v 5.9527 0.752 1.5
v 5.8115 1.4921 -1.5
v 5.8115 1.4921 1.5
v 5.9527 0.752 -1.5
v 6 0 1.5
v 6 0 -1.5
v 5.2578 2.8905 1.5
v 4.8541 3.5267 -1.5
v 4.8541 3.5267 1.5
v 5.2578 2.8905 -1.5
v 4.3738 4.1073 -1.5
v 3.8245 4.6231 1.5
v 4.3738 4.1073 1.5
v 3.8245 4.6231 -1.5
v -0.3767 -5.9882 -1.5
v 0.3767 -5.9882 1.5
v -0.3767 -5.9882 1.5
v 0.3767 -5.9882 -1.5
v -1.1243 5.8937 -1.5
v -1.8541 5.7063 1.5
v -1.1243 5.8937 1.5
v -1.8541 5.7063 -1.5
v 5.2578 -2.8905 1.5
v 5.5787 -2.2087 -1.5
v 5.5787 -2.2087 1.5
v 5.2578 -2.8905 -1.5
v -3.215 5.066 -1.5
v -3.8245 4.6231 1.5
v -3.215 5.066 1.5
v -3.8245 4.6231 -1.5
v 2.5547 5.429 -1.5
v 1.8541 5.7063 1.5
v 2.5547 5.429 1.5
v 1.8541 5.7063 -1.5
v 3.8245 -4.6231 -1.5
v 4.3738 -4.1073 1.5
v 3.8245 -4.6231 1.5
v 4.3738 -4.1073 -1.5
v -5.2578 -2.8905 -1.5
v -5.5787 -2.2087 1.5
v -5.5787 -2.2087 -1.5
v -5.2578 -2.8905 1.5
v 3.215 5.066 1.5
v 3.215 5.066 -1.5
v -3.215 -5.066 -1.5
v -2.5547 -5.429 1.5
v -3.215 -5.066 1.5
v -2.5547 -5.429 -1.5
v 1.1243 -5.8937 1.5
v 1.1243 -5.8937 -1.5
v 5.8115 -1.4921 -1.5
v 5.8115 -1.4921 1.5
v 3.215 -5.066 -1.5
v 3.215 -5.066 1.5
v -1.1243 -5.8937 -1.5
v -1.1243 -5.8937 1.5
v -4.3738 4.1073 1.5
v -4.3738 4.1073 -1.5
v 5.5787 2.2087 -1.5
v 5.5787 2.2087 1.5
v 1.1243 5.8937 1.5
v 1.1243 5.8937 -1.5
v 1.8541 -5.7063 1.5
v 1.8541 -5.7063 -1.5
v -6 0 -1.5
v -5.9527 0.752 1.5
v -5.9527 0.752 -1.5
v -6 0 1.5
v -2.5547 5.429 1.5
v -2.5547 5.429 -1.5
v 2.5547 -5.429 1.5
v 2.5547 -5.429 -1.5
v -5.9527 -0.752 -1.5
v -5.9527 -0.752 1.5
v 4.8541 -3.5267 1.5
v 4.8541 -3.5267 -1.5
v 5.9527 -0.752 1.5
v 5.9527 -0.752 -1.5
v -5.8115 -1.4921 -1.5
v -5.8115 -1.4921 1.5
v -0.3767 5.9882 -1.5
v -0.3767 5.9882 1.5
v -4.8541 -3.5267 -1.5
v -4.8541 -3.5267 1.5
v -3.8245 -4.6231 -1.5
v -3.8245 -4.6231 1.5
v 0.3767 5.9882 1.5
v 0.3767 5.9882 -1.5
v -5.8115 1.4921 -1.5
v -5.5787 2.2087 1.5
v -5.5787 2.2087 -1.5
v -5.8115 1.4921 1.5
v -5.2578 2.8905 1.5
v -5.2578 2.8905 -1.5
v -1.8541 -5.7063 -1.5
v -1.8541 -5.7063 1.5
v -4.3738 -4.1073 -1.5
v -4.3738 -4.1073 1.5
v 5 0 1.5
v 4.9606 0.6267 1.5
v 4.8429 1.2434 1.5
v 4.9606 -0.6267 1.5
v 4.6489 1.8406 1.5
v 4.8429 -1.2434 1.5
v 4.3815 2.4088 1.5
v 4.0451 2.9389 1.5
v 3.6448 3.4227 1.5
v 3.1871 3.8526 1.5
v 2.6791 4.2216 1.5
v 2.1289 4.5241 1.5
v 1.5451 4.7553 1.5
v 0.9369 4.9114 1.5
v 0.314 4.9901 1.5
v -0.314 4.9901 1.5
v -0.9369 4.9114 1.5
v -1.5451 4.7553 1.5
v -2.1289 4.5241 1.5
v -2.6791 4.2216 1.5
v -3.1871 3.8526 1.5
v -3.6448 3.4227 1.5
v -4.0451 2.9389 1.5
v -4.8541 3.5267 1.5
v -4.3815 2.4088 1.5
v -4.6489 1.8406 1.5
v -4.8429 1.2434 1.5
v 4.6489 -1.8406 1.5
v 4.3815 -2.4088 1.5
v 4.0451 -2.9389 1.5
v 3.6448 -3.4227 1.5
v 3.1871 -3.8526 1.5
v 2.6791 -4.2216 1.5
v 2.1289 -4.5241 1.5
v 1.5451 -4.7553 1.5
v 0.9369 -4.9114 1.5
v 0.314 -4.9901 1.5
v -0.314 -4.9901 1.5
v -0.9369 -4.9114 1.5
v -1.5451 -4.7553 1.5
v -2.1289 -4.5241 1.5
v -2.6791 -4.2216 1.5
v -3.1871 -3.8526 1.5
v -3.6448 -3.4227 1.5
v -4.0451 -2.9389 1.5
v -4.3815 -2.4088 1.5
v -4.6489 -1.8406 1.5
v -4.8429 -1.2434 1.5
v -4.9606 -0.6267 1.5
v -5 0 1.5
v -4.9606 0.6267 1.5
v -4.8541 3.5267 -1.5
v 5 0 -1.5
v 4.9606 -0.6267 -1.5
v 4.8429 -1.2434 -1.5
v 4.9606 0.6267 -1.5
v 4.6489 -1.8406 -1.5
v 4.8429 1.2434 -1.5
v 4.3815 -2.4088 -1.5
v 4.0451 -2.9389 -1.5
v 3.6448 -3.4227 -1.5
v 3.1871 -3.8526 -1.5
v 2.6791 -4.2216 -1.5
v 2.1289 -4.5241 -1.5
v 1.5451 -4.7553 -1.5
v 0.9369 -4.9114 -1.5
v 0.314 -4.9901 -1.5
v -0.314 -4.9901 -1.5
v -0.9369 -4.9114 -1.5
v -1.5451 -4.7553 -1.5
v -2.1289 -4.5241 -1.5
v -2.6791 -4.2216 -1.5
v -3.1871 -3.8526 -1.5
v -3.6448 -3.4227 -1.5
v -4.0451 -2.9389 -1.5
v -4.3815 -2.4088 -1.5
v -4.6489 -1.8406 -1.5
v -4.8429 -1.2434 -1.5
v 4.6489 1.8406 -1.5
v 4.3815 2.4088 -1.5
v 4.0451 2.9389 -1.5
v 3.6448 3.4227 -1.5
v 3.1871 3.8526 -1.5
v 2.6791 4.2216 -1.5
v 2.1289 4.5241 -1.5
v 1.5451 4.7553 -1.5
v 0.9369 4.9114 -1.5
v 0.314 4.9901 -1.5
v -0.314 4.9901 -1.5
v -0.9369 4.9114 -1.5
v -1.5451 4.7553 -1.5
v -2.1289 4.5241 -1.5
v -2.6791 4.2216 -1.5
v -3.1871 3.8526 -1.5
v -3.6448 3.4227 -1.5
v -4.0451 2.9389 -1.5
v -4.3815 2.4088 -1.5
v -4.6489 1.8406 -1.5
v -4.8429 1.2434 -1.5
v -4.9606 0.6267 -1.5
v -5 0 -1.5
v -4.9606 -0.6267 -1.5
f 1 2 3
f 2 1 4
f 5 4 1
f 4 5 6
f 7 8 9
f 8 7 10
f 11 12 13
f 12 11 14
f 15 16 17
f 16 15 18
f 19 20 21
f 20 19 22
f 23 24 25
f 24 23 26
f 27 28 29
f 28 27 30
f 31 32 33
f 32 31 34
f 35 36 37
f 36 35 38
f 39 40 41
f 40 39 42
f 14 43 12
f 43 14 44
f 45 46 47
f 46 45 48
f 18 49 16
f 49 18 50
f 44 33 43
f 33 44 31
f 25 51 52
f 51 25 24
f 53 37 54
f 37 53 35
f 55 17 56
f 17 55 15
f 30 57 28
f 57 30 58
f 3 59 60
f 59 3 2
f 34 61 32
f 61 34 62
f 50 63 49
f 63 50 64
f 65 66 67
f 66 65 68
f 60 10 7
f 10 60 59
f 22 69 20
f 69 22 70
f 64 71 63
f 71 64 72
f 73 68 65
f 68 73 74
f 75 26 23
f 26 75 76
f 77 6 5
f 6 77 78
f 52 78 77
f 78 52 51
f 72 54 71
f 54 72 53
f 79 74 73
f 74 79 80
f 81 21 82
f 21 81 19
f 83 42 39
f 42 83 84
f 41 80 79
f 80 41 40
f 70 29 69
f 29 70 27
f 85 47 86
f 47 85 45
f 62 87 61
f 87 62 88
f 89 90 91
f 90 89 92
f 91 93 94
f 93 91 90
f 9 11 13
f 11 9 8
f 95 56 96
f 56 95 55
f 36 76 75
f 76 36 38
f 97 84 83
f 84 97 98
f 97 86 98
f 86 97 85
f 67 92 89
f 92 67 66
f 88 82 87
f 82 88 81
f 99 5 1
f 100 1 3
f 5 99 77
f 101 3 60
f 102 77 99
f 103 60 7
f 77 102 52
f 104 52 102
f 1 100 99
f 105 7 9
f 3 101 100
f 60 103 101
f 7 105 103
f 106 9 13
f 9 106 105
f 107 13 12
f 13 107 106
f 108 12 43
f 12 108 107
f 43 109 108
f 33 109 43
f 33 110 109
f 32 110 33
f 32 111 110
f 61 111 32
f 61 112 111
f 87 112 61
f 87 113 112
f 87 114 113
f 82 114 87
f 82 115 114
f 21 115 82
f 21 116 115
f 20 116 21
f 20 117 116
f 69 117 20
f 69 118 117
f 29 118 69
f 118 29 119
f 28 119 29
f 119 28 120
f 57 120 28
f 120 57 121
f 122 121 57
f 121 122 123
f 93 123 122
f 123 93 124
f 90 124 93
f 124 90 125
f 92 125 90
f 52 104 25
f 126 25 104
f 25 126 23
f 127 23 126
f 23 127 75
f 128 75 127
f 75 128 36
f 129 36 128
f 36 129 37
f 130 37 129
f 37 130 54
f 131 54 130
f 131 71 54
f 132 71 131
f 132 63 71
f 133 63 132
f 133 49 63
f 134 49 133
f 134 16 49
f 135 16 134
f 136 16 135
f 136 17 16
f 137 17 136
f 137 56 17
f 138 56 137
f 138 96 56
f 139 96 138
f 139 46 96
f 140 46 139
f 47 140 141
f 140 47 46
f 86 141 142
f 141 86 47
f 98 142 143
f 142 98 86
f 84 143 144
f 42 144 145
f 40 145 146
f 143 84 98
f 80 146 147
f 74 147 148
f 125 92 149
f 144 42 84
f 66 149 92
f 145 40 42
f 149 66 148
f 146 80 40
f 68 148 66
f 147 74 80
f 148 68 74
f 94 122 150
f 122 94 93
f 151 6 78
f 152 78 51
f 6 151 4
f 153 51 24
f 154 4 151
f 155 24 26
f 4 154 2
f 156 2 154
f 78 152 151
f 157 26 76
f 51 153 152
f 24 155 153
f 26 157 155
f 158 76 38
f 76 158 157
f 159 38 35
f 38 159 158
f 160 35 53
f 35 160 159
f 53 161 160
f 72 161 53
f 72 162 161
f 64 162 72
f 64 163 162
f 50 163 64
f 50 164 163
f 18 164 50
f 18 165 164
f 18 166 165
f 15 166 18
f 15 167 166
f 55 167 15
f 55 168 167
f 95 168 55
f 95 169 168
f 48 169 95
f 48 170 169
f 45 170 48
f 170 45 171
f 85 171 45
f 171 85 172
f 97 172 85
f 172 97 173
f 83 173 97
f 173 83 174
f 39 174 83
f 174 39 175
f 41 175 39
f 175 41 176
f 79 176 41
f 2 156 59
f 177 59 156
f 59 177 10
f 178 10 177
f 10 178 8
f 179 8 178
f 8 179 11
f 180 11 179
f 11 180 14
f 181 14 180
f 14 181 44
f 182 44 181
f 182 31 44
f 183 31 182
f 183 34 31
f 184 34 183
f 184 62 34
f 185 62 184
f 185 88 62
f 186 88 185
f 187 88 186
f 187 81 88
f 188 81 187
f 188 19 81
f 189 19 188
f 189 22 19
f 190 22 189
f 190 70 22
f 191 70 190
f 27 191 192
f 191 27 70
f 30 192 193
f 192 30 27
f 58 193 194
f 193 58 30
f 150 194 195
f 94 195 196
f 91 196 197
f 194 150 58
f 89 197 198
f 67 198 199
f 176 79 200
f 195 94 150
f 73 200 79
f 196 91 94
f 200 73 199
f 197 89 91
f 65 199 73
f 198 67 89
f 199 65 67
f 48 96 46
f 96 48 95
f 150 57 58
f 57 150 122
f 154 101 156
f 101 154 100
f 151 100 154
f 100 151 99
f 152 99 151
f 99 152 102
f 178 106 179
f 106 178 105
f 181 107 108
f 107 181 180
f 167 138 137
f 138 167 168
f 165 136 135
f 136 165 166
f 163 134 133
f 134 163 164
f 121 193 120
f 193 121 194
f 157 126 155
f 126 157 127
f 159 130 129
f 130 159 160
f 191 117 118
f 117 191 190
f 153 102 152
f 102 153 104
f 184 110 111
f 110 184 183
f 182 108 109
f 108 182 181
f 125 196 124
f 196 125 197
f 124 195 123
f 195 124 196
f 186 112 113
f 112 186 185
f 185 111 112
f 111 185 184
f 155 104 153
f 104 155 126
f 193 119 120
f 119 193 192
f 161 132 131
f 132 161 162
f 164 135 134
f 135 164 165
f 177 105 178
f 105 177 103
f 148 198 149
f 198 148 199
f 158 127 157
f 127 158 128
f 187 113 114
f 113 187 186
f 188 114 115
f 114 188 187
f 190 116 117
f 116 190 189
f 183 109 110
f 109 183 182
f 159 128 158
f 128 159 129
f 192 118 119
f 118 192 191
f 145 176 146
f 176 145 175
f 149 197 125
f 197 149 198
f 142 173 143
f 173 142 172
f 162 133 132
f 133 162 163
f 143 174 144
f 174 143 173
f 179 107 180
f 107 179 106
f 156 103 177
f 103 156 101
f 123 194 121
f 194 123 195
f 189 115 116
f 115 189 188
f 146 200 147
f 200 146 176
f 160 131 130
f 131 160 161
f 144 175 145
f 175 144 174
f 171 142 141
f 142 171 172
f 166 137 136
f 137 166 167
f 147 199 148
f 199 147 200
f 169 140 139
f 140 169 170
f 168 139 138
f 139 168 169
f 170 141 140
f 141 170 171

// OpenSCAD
$fn = 50;


difference() {
	union() {
		translate(v = [0, 0, -1.5000000000]) {
			cylinder(h = 3, r = 6.0000000000);
		}
	}
	union() {
		translate(v = [0, 0, -100.0000000000]) {
			cylinder(h = 200, r = 5.0000000000);
		}
	}
}
